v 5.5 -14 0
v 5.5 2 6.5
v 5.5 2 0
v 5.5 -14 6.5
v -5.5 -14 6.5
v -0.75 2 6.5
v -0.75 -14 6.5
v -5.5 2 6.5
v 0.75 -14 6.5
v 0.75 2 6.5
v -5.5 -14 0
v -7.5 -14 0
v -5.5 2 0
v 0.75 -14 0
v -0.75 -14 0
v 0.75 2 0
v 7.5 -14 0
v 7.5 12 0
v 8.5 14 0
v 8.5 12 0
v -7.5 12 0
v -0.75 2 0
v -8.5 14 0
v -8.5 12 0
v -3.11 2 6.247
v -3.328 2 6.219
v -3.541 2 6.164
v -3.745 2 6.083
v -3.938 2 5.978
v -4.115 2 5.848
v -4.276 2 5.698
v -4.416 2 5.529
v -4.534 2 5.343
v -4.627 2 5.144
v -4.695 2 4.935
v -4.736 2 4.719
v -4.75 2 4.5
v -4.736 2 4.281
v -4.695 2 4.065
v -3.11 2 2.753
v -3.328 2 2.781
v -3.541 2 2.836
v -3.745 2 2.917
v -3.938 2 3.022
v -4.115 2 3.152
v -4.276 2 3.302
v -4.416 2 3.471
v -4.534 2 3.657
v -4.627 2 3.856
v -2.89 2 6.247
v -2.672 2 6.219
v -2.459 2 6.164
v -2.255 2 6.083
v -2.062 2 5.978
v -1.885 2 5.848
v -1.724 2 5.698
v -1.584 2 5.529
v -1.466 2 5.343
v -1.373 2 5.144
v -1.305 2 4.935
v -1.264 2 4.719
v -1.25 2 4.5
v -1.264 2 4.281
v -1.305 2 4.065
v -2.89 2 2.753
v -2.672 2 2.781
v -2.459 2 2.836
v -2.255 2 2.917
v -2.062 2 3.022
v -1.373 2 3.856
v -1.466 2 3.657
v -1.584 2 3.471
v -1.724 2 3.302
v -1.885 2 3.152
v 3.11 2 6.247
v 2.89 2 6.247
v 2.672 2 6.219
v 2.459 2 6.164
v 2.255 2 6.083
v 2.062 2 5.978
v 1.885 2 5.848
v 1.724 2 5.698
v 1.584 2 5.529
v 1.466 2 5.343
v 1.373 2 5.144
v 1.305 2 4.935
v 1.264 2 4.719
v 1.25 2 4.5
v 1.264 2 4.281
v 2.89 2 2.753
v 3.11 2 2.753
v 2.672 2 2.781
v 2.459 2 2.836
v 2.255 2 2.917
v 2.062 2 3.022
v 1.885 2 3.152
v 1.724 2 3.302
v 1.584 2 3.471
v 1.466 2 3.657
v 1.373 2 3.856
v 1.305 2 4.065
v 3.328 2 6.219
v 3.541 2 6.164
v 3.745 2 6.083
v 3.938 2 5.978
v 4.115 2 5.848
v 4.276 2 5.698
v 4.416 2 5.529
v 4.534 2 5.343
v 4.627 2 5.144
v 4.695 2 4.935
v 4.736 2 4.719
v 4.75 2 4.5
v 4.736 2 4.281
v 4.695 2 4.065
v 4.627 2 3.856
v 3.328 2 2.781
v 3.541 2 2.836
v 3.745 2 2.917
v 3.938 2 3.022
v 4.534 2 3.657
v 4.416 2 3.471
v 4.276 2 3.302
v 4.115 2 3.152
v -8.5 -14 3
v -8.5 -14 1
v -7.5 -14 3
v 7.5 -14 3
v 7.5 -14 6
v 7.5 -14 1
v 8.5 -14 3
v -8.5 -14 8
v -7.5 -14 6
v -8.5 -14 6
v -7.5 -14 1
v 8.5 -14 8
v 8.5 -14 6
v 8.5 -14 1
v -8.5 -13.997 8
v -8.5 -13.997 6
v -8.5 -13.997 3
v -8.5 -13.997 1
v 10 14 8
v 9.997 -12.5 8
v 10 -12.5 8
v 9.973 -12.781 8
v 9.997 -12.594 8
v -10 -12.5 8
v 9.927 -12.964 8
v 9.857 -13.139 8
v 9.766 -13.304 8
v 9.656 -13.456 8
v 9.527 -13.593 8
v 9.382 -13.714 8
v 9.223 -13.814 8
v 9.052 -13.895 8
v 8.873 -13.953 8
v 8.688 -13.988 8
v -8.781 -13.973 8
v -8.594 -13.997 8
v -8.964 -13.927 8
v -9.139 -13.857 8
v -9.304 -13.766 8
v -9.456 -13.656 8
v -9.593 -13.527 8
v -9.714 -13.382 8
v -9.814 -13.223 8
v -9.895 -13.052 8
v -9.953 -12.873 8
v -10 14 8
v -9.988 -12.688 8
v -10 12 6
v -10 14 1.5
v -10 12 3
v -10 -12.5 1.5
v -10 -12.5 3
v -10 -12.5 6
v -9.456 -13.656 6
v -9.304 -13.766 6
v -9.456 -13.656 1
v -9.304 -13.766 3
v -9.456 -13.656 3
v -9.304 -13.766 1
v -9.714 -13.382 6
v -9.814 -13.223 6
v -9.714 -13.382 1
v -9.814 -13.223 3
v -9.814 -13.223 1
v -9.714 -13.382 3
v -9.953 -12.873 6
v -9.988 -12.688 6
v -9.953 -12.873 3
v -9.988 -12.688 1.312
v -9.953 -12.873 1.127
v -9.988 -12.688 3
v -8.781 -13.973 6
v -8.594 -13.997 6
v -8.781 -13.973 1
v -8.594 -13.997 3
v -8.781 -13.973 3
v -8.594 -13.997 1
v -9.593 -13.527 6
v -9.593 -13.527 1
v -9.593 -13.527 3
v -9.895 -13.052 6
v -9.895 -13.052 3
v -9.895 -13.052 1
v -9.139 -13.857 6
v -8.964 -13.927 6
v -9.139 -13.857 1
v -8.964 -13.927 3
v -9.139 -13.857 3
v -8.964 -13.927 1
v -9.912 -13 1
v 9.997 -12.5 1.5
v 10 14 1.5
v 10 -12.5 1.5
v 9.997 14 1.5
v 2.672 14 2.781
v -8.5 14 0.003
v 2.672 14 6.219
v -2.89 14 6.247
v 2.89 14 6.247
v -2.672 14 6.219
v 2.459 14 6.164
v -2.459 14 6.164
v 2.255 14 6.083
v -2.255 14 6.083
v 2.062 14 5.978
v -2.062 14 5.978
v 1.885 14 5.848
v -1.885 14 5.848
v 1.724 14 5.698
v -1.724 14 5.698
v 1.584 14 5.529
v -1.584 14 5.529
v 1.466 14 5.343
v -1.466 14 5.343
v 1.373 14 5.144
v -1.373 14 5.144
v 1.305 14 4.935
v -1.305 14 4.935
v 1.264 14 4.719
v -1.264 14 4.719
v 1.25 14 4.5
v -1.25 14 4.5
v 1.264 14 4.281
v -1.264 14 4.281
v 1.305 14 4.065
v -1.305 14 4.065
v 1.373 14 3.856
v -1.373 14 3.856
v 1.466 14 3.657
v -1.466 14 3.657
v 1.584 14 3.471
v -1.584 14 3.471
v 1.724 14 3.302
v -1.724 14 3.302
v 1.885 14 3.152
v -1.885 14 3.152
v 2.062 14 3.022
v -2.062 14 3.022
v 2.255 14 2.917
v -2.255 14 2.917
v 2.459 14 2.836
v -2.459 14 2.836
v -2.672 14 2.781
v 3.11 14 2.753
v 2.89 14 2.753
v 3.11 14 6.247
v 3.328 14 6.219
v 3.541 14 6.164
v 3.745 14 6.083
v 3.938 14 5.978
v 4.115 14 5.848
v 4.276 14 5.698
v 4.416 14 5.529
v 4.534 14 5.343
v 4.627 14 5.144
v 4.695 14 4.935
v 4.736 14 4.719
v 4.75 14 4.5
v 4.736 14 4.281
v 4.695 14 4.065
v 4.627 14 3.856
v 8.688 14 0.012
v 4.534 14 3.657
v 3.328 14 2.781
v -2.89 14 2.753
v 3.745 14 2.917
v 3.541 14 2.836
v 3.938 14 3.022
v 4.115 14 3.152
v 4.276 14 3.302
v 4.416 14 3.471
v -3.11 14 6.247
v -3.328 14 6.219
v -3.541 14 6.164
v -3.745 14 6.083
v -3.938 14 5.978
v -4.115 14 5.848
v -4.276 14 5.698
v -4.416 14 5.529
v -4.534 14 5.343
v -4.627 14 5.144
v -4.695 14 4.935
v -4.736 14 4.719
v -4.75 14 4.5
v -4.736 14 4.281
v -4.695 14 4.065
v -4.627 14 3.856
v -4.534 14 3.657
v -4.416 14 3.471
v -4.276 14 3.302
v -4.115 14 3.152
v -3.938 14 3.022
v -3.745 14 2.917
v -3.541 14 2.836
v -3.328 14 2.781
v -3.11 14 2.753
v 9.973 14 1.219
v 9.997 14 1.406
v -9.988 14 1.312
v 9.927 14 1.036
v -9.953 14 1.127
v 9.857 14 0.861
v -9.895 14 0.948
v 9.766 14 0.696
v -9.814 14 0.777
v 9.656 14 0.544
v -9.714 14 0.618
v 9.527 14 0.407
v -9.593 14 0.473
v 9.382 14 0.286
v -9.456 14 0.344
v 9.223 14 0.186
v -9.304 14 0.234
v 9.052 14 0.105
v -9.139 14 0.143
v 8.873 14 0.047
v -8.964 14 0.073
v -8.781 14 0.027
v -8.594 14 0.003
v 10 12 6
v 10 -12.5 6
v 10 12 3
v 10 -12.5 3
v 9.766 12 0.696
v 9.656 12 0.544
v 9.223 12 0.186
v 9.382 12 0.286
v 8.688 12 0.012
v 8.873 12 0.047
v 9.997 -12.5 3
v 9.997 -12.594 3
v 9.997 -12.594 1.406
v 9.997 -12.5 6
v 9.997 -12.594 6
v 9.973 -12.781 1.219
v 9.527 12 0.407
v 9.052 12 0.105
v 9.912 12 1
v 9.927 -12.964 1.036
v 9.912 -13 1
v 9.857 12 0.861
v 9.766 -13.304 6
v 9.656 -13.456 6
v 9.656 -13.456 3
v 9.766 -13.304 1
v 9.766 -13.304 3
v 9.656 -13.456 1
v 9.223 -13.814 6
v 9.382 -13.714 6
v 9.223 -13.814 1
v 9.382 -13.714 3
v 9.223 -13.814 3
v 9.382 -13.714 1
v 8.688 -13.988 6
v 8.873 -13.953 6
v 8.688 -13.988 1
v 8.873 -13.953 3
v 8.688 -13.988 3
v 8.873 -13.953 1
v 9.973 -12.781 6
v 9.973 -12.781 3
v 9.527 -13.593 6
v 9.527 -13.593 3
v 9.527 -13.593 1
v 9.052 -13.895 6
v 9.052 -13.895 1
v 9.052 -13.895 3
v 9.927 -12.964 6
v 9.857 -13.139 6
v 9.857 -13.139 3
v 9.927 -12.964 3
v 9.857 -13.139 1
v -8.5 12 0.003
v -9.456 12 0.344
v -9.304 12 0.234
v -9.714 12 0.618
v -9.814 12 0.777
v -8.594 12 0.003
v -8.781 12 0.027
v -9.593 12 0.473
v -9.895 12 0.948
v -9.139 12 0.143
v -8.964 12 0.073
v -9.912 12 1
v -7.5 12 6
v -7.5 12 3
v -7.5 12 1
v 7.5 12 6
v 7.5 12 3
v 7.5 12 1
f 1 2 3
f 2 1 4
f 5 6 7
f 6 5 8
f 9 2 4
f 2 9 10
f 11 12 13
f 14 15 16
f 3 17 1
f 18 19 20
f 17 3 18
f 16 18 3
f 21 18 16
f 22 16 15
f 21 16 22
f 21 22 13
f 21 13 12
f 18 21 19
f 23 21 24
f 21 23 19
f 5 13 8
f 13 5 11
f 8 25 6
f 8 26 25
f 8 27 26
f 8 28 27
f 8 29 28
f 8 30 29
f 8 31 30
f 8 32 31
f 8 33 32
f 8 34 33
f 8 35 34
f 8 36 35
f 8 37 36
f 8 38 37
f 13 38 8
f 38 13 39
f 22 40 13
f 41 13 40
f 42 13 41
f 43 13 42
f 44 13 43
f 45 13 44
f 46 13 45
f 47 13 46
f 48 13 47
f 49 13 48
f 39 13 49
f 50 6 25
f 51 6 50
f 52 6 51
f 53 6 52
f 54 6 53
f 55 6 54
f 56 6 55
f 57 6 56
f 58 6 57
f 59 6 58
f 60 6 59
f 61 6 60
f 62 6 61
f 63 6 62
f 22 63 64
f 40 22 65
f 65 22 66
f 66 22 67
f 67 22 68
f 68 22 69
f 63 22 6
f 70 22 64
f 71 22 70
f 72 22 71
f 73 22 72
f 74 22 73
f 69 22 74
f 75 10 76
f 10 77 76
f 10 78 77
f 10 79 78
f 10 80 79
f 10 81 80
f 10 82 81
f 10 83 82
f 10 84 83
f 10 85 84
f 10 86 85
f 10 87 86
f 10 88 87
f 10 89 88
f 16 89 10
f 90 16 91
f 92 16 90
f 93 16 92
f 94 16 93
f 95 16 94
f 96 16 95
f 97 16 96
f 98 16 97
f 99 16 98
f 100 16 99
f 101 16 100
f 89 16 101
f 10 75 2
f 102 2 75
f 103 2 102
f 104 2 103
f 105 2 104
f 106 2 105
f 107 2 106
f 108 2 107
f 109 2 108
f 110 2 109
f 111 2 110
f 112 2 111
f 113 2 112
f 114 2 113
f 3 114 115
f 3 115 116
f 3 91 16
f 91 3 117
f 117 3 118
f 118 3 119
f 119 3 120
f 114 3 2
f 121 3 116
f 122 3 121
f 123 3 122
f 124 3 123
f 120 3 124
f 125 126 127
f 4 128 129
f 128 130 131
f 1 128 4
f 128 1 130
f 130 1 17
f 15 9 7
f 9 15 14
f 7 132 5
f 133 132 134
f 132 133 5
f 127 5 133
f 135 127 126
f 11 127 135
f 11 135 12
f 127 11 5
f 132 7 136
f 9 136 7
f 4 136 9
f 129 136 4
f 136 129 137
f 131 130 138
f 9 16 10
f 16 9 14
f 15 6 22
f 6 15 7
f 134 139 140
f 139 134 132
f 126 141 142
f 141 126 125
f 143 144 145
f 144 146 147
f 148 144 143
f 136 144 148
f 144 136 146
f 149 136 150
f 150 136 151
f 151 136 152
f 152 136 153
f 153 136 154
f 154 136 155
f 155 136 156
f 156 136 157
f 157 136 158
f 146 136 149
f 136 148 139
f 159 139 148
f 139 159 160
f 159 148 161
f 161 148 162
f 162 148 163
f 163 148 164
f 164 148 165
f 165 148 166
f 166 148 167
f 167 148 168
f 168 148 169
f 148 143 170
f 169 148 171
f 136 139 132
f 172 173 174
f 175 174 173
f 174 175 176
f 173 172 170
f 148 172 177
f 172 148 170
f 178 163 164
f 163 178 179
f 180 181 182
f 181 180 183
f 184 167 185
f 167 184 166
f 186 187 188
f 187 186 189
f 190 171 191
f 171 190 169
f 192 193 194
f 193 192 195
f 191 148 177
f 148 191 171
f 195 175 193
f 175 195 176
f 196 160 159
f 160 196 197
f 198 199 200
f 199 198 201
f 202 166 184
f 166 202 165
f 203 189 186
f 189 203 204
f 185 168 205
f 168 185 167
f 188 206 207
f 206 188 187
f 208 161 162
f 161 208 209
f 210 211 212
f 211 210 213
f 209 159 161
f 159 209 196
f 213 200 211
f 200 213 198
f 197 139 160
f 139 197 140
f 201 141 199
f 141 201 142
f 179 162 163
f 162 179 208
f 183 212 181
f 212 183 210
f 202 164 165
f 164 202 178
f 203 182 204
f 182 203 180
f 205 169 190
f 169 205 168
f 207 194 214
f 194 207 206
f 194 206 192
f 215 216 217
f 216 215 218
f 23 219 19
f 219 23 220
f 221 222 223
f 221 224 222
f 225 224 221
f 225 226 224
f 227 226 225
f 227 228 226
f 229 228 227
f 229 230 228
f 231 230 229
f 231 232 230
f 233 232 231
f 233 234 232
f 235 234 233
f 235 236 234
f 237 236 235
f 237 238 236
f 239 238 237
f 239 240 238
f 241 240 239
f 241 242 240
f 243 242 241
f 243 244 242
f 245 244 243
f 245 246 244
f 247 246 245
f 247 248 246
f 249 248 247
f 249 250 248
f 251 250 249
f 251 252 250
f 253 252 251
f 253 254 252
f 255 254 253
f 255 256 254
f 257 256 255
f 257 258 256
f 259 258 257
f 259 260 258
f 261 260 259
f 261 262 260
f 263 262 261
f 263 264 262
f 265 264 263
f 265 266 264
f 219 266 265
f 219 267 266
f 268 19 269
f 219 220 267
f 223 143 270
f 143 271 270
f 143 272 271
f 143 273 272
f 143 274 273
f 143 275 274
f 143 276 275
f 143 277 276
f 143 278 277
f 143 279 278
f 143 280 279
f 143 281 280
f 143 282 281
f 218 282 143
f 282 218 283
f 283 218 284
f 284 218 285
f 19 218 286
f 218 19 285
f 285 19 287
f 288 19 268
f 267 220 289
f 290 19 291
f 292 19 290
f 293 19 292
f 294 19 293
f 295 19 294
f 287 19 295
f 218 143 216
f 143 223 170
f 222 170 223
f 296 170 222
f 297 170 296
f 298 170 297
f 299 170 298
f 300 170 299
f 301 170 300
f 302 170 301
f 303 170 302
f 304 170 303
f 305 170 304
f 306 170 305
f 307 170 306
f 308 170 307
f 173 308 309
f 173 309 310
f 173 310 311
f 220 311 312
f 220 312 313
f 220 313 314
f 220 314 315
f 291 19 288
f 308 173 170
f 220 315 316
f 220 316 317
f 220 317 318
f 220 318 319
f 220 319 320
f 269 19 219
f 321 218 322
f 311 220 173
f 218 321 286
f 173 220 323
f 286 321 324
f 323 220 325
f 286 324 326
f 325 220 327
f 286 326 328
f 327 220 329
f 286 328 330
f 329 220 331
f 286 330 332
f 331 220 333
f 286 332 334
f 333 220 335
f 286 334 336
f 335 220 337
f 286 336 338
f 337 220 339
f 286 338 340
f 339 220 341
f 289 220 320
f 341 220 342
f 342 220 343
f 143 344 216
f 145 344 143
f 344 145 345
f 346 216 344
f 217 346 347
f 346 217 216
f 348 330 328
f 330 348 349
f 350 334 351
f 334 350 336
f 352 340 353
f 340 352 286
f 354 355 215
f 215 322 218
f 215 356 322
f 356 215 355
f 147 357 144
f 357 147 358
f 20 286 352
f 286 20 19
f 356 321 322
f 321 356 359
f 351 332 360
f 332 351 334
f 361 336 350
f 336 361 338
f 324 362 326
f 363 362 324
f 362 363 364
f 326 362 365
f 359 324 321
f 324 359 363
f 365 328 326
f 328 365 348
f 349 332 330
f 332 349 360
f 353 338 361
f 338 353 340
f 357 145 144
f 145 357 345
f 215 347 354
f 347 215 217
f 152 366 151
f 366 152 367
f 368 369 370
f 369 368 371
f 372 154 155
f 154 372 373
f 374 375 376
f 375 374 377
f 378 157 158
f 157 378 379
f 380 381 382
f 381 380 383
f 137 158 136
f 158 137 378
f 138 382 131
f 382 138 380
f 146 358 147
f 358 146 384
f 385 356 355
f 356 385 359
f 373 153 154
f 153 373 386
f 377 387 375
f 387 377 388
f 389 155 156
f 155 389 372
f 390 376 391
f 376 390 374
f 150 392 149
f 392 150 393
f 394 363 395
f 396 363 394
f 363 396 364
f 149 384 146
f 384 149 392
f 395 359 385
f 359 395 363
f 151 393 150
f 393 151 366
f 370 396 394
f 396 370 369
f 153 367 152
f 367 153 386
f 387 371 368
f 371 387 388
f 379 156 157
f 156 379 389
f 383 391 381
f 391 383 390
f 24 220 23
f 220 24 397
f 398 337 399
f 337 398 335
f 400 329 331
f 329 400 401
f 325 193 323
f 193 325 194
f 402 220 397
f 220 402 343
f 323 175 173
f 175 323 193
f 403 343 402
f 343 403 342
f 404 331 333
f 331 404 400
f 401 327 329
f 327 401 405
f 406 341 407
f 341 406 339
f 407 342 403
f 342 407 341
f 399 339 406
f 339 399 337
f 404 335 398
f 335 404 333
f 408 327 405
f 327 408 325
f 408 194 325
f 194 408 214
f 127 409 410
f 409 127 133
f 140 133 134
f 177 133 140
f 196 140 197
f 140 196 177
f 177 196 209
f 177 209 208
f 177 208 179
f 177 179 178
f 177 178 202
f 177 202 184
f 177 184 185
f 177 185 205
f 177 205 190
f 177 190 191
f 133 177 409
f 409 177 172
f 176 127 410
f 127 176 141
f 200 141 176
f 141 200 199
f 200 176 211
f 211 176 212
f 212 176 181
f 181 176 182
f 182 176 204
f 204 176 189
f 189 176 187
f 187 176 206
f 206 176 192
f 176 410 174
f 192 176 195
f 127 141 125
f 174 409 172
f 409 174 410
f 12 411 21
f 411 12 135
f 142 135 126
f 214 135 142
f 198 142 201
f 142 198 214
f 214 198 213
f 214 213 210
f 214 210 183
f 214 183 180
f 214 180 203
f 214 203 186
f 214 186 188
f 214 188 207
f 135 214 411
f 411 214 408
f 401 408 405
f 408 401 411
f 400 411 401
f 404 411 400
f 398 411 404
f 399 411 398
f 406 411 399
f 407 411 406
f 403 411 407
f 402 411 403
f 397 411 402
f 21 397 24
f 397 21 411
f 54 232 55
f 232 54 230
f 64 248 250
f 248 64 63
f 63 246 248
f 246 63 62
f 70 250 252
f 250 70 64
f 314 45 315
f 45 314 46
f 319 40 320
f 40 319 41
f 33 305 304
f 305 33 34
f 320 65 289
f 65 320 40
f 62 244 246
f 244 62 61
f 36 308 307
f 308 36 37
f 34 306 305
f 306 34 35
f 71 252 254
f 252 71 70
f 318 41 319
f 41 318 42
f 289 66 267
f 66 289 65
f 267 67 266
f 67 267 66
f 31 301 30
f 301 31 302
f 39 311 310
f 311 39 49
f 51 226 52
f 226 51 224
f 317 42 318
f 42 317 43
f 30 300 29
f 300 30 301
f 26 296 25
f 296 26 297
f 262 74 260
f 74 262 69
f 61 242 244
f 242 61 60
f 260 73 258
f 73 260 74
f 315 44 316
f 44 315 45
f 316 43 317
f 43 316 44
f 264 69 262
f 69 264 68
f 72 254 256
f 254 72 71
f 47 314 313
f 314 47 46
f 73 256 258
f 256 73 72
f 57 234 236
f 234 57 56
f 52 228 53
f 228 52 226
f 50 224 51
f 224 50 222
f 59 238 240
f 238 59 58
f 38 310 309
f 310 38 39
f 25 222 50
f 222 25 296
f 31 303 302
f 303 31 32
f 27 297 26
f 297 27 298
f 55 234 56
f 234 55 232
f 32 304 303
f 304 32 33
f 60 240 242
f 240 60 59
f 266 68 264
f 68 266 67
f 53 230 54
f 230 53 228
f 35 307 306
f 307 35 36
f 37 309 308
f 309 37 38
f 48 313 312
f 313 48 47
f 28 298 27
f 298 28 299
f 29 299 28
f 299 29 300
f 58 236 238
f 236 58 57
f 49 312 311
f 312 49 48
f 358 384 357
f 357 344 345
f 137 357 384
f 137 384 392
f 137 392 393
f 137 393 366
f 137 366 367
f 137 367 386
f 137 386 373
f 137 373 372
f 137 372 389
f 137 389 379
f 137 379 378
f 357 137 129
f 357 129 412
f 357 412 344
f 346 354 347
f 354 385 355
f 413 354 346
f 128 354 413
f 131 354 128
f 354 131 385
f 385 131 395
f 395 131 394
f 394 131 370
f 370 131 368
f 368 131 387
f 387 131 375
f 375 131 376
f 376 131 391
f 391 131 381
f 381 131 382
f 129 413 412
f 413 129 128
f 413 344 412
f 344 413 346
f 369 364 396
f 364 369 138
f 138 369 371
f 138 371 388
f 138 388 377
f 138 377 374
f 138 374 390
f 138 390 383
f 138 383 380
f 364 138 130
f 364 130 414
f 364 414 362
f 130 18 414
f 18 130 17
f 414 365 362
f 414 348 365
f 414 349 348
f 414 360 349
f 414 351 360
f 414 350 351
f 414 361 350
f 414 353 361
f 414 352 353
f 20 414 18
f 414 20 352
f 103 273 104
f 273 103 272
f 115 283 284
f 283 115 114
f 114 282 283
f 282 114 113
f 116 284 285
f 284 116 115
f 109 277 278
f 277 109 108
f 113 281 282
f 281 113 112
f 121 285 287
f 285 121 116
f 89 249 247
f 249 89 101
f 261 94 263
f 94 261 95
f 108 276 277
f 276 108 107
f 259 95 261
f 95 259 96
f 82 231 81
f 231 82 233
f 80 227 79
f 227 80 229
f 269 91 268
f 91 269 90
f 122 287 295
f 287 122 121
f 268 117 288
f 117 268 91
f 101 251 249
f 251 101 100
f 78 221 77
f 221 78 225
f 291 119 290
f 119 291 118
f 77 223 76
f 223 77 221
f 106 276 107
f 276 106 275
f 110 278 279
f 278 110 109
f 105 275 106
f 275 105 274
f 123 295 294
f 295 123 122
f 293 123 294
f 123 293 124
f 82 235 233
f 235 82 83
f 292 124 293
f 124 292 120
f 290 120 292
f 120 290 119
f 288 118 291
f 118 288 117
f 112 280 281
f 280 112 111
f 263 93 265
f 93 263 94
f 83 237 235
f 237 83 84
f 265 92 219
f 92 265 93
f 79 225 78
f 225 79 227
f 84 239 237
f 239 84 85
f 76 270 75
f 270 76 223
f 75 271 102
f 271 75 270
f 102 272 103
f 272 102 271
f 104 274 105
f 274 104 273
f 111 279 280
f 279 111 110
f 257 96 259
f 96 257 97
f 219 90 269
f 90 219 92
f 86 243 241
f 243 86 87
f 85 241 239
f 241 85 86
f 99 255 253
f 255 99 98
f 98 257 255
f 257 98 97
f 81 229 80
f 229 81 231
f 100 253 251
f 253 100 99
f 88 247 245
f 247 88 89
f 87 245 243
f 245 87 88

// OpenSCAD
WIDTH = 20;
LENGTH = 28;
HEIGHT = 8;

SLOT1_WIDTH = 15;
SLOT1_LENGTH = 26;
SLOT1_THICKNESS = 3;
SLOT1_HEIGHT = 3;
SLOT2_WIDTH = SLOT1_WIDTH;
SLOT2_LENGTH = SLOT1_LENGTH;
SLOT2_THICKNESS = 1;
SLOT2_HEIGHT = 0;

POCKET_WIDTH = 11;
POCKET_LENGTH = 16;
POCKET_HEIGHT = 6.5;

SPACER_WIDTH = 1.5;
SPACER_LENGTH = POCKET_LENGTH;

WIRE_HOLE_DIA = 3.5;
WIRE_HOLE_SPACING = 6;
WIRE_HOLE_HEIGHT = 4.5;

CORNER_DIA = 3;

$fn = 50;

difference() {
  translate([-WIDTH/2, -LENGTH/2, 0])
  cube(size = [WIDTH, LENGTH, HEIGHT]);

  #difference() {
    translate([-POCKET_WIDTH/2, -LENGTH/2, 0])
    cube(size = [POCKET_WIDTH, POCKET_LENGTH, POCKET_HEIGHT]);

    translate([-SPACER_WIDTH/2, -LENGTH/2, 0])
    cube(size = [SPACER_WIDTH, SPACER_LENGTH, POCKET_HEIGHT]);
  }

  #for(i = [-1, 1]) {
    translate([-SLOT1_WIDTH/2 + i * SLOT1_WIDTH, -LENGTH/2, SLOT1_HEIGHT])
    cube(size = [SLOT1_WIDTH, SLOT1_LENGTH, SLOT1_THICKNESS]);

    translate([-SLOT2_WIDTH/2 + i * SLOT2_WIDTH, -LENGTH/2, SLOT2_HEIGHT])
    cube(size = [SLOT2_WIDTH, SLOT2_LENGTH, SLOT2_THICKNESS]);

    translate([i * WIRE_HOLE_SPACING/2, -LENGTH/2, WIRE_HOLE_HEIGHT])
    rotate([-90, 0, 0])
    cylinder(d = WIRE_HOLE_DIA, h = LENGTH);

    translate([i * (WIDTH - CORNER_DIA)/2, -(LENGTH - CORNER_DIA)/2, 0])
    rotate([0, 0, i == 1 ? 90 : 0])
    difference() {
      translate([-CORNER_DIA/2, -CORNER_DIA/2, 0])
      cube(size = [CORNER_DIA/2, CORNER_DIA/2, HEIGHT]);
      cylinder(d = CORNER_DIA, h = HEIGHT);
    }

    translate([i * -(WIDTH - CORNER_DIA)/2, LENGTH/2, CORNER_DIA/2])
    rotate([90, 0, 0])
    rotate([0, 0, i == -1 ? 90 : 0])
    difference() {
      translate([-CORNER_DIA/2, -CORNER_DIA/2, 0])
      cube(size = [CORNER_DIA/2, CORNER_DIA/2, LENGTH]);
      cylinder(d = CORNER_DIA, h = LENGTH);
    }
  }
}
